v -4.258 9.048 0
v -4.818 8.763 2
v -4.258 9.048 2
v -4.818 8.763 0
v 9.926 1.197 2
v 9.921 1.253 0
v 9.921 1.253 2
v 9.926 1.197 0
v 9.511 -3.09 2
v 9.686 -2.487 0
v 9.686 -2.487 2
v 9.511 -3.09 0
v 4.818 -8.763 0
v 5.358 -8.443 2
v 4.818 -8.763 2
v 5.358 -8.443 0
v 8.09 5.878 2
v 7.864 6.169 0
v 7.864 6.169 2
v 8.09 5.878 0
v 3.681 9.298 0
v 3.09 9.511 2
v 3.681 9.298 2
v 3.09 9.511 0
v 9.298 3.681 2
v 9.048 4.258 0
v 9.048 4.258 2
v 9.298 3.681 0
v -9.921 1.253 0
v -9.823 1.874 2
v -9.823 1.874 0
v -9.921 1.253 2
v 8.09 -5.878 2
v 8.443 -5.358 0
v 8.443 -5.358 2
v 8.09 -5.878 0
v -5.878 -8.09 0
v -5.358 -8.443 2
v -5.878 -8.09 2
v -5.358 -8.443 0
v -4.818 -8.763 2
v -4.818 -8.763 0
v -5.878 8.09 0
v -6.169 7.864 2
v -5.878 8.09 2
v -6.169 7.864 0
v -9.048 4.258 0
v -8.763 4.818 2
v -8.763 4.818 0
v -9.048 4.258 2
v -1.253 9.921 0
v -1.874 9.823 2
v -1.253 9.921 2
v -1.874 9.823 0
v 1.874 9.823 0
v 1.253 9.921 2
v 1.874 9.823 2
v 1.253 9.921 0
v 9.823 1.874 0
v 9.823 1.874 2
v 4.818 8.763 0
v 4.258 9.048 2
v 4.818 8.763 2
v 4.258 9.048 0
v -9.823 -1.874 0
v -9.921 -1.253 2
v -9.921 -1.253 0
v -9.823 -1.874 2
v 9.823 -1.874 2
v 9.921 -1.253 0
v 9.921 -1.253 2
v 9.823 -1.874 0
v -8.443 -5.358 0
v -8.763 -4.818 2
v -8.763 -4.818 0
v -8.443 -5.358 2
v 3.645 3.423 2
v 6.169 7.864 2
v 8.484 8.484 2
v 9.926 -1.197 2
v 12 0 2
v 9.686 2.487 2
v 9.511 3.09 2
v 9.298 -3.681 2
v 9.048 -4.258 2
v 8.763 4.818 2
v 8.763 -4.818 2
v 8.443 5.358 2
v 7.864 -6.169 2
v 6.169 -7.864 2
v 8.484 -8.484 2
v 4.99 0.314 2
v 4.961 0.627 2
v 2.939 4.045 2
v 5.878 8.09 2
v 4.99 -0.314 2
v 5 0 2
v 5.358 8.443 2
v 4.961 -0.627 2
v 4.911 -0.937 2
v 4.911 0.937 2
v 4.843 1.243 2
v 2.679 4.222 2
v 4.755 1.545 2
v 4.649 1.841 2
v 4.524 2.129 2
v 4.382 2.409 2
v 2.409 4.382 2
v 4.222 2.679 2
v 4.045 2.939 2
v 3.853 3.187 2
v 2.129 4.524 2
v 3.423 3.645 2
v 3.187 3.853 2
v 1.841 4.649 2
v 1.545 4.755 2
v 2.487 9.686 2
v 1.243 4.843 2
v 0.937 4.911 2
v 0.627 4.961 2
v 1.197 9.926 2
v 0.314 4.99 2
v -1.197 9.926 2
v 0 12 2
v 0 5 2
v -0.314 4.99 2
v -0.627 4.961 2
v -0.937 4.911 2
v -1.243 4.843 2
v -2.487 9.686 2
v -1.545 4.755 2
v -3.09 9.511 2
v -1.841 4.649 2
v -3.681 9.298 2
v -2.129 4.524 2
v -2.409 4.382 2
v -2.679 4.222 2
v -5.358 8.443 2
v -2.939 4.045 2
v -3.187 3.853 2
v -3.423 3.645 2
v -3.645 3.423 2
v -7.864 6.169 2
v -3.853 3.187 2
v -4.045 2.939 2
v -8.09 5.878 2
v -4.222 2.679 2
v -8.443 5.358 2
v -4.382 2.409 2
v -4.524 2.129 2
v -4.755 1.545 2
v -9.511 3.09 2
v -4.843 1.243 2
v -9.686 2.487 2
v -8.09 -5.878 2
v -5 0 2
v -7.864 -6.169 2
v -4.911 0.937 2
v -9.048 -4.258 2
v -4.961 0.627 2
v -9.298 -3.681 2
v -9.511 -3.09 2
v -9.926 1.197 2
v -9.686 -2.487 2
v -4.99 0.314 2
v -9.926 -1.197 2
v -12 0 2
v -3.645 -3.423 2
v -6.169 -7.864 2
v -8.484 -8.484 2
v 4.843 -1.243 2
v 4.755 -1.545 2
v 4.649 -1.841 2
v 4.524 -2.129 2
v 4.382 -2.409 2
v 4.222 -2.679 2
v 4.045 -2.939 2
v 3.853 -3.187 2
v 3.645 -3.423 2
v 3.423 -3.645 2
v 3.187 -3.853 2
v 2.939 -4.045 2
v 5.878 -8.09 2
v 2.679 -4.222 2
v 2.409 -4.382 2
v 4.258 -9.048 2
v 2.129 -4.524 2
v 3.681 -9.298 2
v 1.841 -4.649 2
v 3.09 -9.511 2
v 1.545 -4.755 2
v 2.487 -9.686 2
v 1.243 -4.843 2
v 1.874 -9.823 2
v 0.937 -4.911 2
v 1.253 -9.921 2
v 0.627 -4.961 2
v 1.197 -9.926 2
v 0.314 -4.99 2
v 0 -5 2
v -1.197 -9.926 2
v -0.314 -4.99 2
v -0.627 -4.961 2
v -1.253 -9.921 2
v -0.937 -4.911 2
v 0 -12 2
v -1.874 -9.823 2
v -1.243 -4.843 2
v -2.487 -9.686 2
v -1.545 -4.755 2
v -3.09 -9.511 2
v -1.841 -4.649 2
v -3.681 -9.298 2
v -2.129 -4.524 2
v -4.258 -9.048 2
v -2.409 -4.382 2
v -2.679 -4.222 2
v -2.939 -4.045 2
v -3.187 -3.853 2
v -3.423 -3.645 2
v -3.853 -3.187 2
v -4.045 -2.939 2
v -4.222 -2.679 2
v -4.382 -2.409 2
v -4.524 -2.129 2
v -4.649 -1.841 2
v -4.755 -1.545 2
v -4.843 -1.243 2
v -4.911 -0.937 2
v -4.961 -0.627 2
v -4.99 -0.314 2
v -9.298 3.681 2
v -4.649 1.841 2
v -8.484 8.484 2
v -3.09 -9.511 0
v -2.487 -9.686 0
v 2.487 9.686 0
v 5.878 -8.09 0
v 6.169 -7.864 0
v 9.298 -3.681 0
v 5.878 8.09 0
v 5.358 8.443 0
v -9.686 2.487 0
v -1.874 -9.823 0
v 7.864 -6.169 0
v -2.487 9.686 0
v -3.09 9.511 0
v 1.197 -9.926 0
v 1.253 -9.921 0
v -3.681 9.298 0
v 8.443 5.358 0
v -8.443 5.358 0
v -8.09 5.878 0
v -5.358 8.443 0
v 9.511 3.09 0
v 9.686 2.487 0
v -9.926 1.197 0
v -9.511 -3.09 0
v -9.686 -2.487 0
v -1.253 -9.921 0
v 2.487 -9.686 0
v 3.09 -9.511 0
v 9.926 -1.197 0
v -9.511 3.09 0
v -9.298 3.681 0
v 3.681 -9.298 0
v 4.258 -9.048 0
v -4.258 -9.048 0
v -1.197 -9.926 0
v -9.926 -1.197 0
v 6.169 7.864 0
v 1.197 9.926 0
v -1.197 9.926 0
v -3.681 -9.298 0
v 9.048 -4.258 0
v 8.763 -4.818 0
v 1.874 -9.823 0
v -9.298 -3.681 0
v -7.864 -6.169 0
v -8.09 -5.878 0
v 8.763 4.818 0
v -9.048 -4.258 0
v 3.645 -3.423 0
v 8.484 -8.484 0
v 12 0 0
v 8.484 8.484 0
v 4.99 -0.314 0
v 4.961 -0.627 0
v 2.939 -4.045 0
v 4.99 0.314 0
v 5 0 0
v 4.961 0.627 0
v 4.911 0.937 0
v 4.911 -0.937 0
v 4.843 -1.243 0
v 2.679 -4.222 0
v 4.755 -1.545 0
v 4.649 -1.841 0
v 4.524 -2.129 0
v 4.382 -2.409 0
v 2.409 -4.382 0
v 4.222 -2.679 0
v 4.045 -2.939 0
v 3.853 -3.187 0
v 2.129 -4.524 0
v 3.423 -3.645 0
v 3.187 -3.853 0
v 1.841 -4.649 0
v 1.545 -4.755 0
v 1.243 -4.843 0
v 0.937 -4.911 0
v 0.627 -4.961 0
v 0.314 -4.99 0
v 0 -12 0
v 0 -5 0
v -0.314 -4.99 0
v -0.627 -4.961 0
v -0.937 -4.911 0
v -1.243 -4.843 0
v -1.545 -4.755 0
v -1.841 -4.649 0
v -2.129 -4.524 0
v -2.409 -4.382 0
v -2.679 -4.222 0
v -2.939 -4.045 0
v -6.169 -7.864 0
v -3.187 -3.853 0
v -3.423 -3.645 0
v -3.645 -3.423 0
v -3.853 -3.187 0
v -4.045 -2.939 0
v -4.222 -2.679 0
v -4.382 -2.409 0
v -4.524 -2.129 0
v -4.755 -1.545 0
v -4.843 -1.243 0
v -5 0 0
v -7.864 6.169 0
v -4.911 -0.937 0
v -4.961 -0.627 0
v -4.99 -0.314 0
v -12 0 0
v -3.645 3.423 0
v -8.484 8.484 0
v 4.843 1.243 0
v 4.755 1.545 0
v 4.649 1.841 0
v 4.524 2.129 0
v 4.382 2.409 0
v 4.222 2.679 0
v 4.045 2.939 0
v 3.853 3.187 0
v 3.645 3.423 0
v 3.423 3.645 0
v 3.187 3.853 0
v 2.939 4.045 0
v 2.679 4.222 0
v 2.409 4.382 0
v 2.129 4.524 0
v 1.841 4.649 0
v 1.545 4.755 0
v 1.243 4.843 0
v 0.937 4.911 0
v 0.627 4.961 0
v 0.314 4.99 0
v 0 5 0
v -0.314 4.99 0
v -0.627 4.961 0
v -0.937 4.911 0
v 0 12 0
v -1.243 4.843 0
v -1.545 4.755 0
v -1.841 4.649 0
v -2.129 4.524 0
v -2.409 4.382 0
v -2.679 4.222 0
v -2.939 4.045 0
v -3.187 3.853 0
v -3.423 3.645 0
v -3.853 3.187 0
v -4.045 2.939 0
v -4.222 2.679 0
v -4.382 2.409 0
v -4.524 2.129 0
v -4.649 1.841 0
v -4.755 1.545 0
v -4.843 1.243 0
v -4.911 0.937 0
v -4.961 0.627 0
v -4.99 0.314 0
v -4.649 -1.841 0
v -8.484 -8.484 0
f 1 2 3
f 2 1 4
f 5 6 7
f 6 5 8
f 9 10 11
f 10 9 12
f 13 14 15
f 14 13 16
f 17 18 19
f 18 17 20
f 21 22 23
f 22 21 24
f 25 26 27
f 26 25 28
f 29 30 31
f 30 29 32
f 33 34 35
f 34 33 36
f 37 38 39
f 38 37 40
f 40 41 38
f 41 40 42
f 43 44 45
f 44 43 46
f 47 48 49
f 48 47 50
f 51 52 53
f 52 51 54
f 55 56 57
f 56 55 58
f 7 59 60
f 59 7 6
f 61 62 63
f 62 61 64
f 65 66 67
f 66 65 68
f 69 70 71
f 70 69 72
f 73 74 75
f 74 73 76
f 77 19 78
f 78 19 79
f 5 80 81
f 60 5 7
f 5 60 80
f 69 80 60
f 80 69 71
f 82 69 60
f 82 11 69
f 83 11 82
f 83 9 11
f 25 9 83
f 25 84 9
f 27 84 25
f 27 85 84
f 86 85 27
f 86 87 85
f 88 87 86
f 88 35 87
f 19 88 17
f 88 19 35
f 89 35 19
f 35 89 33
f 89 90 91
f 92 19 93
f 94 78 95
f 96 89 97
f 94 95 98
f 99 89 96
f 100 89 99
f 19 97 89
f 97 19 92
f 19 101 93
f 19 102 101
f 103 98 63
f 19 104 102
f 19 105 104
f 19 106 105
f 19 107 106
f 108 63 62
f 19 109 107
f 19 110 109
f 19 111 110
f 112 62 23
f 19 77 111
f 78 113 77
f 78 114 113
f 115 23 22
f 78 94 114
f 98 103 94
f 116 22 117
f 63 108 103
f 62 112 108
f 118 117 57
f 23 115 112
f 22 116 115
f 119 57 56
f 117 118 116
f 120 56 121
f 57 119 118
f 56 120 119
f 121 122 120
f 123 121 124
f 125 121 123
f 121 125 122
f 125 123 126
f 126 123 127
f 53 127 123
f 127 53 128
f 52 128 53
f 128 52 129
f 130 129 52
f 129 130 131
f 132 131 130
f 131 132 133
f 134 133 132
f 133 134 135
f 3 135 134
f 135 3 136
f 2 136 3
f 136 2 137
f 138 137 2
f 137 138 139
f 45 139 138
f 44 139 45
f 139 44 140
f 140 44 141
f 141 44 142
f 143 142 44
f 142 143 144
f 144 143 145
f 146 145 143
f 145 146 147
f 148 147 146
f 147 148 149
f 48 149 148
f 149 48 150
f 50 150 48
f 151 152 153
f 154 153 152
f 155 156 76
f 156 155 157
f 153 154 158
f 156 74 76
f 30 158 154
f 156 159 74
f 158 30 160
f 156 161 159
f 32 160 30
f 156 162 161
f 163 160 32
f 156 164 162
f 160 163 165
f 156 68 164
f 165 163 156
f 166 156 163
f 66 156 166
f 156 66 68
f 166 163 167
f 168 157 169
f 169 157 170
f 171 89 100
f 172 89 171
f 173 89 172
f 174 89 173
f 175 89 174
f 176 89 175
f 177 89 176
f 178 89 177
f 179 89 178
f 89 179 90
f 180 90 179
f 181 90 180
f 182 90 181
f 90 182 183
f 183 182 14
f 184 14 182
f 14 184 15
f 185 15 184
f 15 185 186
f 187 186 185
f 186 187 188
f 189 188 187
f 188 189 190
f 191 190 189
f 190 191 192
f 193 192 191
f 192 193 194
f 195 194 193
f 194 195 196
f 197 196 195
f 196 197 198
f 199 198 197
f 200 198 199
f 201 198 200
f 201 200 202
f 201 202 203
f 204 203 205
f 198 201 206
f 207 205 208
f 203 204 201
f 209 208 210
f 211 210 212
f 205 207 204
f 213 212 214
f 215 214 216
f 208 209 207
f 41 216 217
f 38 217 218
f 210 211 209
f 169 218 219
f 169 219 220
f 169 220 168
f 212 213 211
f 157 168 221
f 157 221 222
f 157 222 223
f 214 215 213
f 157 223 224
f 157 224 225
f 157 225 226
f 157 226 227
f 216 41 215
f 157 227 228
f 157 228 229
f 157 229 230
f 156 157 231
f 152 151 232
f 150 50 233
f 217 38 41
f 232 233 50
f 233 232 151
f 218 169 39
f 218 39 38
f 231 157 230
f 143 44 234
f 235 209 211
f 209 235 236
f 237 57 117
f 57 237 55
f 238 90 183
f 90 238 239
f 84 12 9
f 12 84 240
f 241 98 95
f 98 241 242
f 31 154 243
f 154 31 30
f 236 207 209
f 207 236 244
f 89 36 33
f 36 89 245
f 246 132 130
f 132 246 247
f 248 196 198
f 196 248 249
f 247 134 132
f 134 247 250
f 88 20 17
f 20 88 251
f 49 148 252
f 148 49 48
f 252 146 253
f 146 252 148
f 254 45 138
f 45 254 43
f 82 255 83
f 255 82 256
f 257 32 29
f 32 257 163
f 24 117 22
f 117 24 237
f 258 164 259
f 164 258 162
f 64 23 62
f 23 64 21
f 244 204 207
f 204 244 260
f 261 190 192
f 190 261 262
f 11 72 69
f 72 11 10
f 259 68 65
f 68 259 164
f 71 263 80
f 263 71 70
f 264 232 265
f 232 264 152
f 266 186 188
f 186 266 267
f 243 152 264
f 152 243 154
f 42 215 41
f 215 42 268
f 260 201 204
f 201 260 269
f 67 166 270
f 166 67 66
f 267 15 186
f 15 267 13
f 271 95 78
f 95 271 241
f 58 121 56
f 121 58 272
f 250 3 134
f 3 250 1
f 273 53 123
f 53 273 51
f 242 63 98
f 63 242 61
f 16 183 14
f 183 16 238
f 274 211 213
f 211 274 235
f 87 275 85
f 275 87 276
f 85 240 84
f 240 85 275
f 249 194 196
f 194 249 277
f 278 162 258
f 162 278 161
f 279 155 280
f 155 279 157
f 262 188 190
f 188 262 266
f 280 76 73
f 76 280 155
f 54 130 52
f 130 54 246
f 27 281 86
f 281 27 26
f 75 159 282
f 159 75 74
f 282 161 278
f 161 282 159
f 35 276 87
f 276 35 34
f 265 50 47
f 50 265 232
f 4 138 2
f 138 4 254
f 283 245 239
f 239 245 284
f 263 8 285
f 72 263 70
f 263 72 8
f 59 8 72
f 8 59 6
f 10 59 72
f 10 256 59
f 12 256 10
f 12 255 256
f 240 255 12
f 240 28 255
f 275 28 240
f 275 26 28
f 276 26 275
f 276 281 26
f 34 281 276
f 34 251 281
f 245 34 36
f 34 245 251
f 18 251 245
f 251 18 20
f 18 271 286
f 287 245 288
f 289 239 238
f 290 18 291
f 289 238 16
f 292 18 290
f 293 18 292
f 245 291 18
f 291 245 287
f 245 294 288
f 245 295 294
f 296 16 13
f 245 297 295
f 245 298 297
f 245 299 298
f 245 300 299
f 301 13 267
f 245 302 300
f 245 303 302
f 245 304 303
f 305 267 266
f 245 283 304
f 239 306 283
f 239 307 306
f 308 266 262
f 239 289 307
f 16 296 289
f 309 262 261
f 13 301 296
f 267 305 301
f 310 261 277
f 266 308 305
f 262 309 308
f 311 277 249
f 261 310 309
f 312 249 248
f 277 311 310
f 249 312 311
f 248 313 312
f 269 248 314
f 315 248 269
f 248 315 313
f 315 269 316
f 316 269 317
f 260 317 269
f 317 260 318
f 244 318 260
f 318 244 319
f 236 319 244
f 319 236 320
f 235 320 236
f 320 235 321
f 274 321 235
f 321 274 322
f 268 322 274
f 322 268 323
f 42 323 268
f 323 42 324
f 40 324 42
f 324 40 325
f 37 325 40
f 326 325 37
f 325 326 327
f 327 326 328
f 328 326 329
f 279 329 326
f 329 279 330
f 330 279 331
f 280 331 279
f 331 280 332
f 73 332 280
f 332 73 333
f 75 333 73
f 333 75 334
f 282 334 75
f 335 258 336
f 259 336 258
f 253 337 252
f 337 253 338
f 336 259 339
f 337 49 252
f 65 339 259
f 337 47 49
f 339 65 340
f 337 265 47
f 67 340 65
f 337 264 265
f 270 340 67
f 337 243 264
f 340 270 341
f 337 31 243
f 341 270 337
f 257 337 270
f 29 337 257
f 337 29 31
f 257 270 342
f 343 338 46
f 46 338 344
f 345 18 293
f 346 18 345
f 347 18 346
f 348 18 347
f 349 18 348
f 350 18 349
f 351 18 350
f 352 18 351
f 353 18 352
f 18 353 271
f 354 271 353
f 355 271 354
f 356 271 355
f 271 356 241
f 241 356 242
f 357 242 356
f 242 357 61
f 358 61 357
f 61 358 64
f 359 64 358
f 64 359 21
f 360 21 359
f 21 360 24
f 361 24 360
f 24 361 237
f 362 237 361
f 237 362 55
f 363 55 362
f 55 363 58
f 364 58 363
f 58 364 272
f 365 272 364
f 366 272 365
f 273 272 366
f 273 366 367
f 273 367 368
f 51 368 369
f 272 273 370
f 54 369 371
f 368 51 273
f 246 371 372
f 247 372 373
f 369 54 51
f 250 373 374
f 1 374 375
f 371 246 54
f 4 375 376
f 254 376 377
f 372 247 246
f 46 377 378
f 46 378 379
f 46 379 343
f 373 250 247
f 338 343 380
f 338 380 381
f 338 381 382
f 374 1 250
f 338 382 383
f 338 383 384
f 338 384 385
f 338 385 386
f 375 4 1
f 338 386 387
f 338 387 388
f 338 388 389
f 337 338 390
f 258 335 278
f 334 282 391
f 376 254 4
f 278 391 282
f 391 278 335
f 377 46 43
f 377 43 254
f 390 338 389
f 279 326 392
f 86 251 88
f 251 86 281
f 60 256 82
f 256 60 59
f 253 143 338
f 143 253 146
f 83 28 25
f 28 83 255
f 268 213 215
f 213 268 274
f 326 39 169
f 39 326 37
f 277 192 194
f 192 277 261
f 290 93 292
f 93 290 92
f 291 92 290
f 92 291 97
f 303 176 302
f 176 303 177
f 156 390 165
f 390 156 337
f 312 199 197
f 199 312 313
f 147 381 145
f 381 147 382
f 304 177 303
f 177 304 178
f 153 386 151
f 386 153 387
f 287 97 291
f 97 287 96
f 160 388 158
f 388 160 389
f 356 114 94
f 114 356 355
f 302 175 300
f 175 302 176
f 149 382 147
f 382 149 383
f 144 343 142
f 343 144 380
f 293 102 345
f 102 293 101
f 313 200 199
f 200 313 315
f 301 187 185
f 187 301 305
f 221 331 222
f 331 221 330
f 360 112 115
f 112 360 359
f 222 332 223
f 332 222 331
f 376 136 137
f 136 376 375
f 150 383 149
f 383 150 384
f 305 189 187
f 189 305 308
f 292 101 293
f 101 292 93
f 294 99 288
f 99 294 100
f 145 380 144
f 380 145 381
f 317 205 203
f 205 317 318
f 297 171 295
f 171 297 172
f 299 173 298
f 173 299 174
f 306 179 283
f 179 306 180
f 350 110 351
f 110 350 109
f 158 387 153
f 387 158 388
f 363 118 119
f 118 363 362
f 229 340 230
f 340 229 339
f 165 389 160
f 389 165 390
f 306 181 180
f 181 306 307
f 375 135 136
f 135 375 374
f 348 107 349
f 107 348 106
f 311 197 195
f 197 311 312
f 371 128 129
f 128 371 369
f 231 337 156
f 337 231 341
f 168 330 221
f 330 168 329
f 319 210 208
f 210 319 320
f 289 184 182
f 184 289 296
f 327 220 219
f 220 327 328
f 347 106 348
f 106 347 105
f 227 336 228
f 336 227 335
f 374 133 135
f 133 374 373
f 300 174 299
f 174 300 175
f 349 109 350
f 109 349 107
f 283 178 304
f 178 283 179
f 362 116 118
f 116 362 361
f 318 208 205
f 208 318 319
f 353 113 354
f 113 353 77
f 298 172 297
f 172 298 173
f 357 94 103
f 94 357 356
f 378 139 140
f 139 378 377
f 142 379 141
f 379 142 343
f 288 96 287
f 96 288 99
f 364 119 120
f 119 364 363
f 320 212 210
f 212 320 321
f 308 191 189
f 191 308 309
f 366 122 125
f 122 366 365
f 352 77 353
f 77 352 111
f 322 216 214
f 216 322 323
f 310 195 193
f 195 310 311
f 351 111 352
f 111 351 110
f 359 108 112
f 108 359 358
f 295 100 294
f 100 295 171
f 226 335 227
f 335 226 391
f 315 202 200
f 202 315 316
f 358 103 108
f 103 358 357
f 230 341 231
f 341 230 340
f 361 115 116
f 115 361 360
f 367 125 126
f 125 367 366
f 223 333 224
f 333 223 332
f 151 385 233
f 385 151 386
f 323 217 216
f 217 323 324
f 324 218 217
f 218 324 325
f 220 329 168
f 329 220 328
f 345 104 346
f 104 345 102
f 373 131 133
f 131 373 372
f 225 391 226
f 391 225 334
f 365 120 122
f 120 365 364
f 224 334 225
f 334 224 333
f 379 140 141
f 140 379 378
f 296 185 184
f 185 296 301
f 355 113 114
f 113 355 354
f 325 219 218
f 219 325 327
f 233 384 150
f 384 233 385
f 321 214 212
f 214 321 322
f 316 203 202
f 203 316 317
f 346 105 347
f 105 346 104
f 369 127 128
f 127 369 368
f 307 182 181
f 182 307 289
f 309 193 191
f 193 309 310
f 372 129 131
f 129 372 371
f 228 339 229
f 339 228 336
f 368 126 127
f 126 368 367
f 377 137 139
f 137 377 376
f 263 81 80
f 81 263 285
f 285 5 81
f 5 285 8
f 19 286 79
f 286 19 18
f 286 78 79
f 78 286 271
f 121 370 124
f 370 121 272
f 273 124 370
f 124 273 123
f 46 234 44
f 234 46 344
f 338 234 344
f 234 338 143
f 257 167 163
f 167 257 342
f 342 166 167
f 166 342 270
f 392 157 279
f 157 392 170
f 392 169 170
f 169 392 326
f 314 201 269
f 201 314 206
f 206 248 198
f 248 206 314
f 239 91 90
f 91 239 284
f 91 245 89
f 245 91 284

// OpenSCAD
union() {
  difference() {
    linear_extrude(height = 2.0) {
      circle(r = 10.0, $fn = 100);
    }
    linear_extrude(height = 2.0) {
      circle(r = 5.0, $fn = 100);
    }
  }
  union() {
    union() {
      union() {
        union() {
          union() {
            union() {
              union() {
                translate([10.0, 0, 0]) {
                  linear_extrude(height = 2.0) {
                    circle(r = 2.0, $fn = 3);
                  }
                }
                translate([7.07, 0, 0]) {
                  translate([0, 7.07, 0]) {
                    rotate([0, 0, 45.0]) {
                      linear_extrude(height = 2.0) {
                        circle(r = 2.0, $fn = 3);
                      }
                    }
                  }
                }
              }
              translate([0, 10.0, 0]) {
                rotate([0, 0, 90.0]) {
                  linear_extrude(height = 2.0) {
                    circle(r = 2.0, $fn = 3);
                  }
                }
              }
            }
            translate([-7.07, 0, 0]) {
              translate([0, 7.07, 0]) {
                rotate([0, 0, 135.0]) {
                  linear_extrude(height = 2.0) {
                    circle(r = 2.0, $fn = 3);
                  }
                }
              }
            }
          }
          translate([-10.0, 0, 0]) {
            rotate([0, 0, 180.0]) {
              linear_extrude(height = 2.0) {
                circle(r = 2.0, $fn = 3);
              }
            }
          }
        }
        translate([-7.07, 0, 0]) {
          translate([0, -7.07, 0]) {
            rotate([0, 0, 225.0]) {
              linear_extrude(height = 2.0) {
                circle(r = 2.0, $fn = 3);
              }
            }
          }
        }
      }
      translate([0, -10.0, 0]) {
        rotate([0, 0, 270.0]) {
          linear_extrude(height = 2.0) {
            circle(r = 2.0, $fn = 3);
          }
        }
      }
    }
    translate([7.07, 0, 0]) {
      translate([0, -7.07, 0]) {
        rotate([0, 0, 315.0]) {
          linear_extrude(height = 2.0) {
            circle(r = 2.0, $fn = 3);
          }
        }
      }
    }
  }
}
$fn = 50;
